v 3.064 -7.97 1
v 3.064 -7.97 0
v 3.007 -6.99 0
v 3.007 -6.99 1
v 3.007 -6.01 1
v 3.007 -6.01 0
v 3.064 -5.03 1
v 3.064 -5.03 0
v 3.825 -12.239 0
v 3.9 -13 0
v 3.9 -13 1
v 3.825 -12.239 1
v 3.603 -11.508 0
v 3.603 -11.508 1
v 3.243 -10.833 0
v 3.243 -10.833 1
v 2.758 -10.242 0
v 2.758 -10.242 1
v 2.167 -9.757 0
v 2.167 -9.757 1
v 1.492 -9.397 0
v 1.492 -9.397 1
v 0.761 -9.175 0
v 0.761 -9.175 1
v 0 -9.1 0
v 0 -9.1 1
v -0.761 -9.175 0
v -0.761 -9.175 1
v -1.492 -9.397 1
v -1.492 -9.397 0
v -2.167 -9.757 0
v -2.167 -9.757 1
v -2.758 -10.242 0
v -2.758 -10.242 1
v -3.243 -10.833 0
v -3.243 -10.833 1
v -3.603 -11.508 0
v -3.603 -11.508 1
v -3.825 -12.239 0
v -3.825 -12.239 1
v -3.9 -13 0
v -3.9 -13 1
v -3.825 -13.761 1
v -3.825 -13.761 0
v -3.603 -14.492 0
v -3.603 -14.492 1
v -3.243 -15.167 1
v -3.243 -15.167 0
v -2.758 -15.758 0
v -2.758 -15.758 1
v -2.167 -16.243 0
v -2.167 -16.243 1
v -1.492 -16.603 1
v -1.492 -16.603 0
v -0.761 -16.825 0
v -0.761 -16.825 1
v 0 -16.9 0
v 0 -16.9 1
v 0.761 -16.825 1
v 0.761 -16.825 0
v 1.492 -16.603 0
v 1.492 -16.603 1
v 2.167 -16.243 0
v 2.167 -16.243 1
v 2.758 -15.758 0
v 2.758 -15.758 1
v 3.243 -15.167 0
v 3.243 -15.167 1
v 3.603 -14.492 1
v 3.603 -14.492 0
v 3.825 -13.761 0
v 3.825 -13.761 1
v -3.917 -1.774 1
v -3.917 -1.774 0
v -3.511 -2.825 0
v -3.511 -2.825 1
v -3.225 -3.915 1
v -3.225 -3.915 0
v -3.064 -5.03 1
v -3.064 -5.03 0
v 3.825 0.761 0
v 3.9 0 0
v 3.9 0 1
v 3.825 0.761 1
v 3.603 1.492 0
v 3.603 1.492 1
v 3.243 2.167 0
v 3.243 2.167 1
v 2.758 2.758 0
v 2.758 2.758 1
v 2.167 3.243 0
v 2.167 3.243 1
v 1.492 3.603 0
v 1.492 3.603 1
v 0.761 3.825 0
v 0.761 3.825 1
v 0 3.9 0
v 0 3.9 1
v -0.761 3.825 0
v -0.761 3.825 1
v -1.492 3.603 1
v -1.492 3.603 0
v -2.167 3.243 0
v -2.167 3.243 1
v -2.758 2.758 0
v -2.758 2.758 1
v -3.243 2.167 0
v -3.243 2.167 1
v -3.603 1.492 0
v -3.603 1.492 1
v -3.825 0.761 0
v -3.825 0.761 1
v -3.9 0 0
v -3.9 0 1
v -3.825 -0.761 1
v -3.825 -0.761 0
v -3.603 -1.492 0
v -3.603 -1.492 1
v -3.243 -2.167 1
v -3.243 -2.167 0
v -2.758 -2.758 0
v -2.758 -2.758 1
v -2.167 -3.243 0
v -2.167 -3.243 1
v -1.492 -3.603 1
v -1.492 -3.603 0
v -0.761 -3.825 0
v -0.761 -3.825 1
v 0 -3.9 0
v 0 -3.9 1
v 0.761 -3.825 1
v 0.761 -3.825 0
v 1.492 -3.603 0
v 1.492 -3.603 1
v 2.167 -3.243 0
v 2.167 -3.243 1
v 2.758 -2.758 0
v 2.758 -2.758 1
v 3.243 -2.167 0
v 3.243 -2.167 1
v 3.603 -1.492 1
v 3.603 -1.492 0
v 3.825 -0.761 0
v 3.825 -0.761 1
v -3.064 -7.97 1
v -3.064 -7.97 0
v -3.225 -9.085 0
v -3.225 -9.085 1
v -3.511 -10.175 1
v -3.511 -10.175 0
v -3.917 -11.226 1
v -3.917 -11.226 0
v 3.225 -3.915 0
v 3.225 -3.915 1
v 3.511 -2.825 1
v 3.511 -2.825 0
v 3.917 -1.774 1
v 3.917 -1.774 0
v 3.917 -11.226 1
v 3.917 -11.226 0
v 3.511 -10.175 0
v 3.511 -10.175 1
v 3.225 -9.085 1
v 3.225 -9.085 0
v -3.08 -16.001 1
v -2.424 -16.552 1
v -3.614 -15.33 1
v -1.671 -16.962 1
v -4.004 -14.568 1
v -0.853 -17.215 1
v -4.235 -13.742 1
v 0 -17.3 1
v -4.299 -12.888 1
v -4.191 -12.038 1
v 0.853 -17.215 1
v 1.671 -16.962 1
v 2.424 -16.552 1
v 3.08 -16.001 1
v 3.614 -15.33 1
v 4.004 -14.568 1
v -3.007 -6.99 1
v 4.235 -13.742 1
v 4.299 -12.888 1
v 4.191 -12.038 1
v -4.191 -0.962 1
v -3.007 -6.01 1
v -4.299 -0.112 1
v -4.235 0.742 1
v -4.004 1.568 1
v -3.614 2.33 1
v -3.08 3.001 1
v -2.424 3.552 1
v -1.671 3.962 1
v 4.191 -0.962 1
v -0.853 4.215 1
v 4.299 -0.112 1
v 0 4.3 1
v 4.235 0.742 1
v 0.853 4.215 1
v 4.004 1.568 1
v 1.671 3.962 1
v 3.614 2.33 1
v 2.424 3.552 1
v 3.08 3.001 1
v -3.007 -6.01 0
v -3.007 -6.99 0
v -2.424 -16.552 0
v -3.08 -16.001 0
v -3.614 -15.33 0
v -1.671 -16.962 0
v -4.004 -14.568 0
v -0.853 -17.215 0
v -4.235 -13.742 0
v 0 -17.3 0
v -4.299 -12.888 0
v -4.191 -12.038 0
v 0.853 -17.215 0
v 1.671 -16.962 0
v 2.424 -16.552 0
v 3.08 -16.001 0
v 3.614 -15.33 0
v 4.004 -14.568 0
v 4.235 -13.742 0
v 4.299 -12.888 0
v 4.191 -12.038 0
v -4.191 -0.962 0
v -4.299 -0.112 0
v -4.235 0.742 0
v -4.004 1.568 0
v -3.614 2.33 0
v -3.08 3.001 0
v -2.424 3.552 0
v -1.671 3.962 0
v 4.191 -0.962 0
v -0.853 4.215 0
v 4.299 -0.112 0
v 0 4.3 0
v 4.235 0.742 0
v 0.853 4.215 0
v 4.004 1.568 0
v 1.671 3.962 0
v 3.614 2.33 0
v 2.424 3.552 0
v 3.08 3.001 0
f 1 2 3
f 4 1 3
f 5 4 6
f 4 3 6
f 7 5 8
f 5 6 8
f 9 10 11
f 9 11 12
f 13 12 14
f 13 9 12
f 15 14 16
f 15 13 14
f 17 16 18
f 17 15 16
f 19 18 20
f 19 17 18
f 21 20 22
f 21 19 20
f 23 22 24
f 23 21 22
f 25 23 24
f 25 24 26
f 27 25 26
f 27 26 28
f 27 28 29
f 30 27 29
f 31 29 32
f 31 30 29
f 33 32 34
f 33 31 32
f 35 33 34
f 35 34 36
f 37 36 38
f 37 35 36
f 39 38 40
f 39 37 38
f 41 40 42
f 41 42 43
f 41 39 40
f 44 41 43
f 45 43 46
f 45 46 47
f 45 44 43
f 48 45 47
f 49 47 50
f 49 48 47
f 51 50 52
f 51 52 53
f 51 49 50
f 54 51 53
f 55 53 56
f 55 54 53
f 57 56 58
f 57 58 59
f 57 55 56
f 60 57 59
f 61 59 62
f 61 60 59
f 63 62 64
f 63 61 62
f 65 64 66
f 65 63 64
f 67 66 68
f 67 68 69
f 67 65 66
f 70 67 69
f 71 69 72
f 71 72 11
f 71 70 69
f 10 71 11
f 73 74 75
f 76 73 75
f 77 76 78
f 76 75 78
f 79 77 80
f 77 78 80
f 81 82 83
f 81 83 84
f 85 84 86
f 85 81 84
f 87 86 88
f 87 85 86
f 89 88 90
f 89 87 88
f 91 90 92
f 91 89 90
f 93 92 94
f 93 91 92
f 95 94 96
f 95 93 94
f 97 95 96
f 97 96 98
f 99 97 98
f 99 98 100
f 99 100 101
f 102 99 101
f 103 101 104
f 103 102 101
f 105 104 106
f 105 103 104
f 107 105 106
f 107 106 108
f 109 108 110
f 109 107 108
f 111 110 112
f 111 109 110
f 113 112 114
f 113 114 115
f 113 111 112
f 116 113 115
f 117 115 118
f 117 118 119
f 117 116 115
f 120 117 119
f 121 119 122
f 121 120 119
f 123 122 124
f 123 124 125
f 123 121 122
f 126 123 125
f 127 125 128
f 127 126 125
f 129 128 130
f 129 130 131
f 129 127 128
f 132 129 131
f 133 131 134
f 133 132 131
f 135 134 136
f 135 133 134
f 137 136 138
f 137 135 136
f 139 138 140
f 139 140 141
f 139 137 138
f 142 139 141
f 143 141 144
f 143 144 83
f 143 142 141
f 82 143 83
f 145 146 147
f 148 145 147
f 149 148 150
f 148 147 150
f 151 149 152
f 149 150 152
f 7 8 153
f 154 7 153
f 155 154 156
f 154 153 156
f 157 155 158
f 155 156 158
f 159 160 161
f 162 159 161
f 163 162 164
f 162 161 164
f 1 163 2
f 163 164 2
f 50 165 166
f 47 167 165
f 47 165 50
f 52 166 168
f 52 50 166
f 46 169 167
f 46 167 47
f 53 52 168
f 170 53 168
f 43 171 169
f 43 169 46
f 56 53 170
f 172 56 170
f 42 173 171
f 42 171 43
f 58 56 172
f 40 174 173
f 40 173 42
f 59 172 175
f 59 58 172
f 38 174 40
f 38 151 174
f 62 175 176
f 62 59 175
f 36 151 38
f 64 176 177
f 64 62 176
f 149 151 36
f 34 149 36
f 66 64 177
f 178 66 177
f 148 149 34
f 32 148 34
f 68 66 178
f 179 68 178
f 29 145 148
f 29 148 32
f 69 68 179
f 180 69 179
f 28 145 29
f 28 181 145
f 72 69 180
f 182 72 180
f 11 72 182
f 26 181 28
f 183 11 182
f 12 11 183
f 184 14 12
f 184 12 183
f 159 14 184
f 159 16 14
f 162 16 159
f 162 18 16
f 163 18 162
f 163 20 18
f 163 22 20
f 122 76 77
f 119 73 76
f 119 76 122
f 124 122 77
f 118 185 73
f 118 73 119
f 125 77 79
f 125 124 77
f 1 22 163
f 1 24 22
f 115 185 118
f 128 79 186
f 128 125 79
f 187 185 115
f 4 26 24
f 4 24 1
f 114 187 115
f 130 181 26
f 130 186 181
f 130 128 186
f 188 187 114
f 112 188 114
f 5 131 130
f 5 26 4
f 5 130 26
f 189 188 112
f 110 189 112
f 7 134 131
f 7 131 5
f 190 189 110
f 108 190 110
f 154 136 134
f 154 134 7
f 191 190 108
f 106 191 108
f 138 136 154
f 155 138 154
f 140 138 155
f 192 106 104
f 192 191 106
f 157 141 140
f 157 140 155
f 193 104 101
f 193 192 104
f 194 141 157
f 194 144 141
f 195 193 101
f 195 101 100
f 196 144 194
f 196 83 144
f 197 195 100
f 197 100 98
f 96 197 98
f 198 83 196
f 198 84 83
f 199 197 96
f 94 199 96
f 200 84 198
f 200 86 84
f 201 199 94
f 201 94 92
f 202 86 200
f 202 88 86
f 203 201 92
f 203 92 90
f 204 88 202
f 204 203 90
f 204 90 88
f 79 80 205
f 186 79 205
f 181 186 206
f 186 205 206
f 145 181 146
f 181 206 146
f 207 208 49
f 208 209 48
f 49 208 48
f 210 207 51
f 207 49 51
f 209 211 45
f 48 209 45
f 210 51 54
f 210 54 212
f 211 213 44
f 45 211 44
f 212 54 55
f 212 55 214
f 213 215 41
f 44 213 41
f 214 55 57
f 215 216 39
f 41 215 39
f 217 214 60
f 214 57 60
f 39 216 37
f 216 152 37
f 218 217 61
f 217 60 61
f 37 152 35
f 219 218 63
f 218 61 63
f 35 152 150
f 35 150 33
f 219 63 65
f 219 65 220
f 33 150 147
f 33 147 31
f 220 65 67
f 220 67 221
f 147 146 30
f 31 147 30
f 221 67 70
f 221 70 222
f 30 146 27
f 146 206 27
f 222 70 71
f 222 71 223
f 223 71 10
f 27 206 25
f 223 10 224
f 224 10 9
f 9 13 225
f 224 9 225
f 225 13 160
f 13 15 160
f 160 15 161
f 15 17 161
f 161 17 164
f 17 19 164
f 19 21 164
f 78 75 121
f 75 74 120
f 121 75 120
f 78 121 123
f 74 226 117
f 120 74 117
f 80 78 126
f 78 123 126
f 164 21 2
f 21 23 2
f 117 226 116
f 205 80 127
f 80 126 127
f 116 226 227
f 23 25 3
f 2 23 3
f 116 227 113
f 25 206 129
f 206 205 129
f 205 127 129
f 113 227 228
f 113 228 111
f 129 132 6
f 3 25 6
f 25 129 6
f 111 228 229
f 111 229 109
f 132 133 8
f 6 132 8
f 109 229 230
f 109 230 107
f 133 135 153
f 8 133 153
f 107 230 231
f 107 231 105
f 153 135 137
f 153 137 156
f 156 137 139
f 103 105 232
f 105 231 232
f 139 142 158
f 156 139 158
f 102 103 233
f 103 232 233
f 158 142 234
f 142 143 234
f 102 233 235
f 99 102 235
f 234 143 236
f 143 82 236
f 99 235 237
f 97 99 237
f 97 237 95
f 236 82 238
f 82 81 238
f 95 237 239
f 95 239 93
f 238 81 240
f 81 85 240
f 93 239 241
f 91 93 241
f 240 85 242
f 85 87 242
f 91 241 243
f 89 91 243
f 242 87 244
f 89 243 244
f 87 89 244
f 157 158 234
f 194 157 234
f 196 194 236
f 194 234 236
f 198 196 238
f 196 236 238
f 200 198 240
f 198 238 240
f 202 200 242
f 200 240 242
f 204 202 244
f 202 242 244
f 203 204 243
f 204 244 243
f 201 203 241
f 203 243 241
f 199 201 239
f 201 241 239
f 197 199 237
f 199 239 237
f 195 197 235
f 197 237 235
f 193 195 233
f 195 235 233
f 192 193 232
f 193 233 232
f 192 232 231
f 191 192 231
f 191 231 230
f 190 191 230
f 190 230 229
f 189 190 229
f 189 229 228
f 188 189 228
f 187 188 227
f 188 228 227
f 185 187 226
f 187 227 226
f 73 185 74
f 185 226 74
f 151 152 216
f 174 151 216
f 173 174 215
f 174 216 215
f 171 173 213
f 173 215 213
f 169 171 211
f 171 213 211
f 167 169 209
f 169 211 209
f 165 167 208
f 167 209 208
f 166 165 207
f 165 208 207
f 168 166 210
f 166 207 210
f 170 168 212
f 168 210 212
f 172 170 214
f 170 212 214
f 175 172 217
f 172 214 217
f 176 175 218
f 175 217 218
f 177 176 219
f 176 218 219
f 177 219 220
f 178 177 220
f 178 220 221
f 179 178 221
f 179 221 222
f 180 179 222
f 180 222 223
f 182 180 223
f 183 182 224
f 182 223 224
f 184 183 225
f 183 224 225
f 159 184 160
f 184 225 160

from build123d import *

# Parameters (mm, degrees)
SKETCH_1_R      = 3.9
EXTRUDE_1_DEPTH = 1


with BuildPart() as part:
    # Эскиз1 → Вытянуть1 (new body)
    with BuildSketch(Plane.XY):
        with BuildLine():
            ThreePointArc((3.91695076, -1.774118582), (0, 4.3), (-3.91695076, -1.774118582))
            ThreePointArc((-3.91695076, -1.774118582), (-3.352489907, -3.366100957), (-3.064020566, -5.030375386))
            ThreePointArc((-3.064020566, -5.030375386), (-3, -6.5), (-3.064020566, -7.969624614))
            ThreePointArc((-3.064020566, -7.969624614), (-3.352489907, -9.633899043), (-3.91695076, -11.225881418))
            ThreePointArc((-3.91695076, -11.225881418), (0, -17.3), (3.91695076, -11.225881418))
            ThreePointArc((3.91695076, -11.225881418), (3.352489907, -9.633899043), (3.064020566, -7.969624614))
            ThreePointArc((3.064020566, -7.969624614), (3, -6.5), (3.064020566, -5.030375386))
            ThreePointArc((3.064020566, -5.030375386), (3.352489907, -3.366100957), (3.91695076, -1.774118582))
        make_face()
        Circle(SKETCH_1_R, mode=Mode.SUBTRACT)
        with Locations((0, -13)):
            Circle(SKETCH_1_R, mode=Mode.SUBTRACT)
    extrude(amount=EXTRUDE_1_DEPTH)


solid = part.part
